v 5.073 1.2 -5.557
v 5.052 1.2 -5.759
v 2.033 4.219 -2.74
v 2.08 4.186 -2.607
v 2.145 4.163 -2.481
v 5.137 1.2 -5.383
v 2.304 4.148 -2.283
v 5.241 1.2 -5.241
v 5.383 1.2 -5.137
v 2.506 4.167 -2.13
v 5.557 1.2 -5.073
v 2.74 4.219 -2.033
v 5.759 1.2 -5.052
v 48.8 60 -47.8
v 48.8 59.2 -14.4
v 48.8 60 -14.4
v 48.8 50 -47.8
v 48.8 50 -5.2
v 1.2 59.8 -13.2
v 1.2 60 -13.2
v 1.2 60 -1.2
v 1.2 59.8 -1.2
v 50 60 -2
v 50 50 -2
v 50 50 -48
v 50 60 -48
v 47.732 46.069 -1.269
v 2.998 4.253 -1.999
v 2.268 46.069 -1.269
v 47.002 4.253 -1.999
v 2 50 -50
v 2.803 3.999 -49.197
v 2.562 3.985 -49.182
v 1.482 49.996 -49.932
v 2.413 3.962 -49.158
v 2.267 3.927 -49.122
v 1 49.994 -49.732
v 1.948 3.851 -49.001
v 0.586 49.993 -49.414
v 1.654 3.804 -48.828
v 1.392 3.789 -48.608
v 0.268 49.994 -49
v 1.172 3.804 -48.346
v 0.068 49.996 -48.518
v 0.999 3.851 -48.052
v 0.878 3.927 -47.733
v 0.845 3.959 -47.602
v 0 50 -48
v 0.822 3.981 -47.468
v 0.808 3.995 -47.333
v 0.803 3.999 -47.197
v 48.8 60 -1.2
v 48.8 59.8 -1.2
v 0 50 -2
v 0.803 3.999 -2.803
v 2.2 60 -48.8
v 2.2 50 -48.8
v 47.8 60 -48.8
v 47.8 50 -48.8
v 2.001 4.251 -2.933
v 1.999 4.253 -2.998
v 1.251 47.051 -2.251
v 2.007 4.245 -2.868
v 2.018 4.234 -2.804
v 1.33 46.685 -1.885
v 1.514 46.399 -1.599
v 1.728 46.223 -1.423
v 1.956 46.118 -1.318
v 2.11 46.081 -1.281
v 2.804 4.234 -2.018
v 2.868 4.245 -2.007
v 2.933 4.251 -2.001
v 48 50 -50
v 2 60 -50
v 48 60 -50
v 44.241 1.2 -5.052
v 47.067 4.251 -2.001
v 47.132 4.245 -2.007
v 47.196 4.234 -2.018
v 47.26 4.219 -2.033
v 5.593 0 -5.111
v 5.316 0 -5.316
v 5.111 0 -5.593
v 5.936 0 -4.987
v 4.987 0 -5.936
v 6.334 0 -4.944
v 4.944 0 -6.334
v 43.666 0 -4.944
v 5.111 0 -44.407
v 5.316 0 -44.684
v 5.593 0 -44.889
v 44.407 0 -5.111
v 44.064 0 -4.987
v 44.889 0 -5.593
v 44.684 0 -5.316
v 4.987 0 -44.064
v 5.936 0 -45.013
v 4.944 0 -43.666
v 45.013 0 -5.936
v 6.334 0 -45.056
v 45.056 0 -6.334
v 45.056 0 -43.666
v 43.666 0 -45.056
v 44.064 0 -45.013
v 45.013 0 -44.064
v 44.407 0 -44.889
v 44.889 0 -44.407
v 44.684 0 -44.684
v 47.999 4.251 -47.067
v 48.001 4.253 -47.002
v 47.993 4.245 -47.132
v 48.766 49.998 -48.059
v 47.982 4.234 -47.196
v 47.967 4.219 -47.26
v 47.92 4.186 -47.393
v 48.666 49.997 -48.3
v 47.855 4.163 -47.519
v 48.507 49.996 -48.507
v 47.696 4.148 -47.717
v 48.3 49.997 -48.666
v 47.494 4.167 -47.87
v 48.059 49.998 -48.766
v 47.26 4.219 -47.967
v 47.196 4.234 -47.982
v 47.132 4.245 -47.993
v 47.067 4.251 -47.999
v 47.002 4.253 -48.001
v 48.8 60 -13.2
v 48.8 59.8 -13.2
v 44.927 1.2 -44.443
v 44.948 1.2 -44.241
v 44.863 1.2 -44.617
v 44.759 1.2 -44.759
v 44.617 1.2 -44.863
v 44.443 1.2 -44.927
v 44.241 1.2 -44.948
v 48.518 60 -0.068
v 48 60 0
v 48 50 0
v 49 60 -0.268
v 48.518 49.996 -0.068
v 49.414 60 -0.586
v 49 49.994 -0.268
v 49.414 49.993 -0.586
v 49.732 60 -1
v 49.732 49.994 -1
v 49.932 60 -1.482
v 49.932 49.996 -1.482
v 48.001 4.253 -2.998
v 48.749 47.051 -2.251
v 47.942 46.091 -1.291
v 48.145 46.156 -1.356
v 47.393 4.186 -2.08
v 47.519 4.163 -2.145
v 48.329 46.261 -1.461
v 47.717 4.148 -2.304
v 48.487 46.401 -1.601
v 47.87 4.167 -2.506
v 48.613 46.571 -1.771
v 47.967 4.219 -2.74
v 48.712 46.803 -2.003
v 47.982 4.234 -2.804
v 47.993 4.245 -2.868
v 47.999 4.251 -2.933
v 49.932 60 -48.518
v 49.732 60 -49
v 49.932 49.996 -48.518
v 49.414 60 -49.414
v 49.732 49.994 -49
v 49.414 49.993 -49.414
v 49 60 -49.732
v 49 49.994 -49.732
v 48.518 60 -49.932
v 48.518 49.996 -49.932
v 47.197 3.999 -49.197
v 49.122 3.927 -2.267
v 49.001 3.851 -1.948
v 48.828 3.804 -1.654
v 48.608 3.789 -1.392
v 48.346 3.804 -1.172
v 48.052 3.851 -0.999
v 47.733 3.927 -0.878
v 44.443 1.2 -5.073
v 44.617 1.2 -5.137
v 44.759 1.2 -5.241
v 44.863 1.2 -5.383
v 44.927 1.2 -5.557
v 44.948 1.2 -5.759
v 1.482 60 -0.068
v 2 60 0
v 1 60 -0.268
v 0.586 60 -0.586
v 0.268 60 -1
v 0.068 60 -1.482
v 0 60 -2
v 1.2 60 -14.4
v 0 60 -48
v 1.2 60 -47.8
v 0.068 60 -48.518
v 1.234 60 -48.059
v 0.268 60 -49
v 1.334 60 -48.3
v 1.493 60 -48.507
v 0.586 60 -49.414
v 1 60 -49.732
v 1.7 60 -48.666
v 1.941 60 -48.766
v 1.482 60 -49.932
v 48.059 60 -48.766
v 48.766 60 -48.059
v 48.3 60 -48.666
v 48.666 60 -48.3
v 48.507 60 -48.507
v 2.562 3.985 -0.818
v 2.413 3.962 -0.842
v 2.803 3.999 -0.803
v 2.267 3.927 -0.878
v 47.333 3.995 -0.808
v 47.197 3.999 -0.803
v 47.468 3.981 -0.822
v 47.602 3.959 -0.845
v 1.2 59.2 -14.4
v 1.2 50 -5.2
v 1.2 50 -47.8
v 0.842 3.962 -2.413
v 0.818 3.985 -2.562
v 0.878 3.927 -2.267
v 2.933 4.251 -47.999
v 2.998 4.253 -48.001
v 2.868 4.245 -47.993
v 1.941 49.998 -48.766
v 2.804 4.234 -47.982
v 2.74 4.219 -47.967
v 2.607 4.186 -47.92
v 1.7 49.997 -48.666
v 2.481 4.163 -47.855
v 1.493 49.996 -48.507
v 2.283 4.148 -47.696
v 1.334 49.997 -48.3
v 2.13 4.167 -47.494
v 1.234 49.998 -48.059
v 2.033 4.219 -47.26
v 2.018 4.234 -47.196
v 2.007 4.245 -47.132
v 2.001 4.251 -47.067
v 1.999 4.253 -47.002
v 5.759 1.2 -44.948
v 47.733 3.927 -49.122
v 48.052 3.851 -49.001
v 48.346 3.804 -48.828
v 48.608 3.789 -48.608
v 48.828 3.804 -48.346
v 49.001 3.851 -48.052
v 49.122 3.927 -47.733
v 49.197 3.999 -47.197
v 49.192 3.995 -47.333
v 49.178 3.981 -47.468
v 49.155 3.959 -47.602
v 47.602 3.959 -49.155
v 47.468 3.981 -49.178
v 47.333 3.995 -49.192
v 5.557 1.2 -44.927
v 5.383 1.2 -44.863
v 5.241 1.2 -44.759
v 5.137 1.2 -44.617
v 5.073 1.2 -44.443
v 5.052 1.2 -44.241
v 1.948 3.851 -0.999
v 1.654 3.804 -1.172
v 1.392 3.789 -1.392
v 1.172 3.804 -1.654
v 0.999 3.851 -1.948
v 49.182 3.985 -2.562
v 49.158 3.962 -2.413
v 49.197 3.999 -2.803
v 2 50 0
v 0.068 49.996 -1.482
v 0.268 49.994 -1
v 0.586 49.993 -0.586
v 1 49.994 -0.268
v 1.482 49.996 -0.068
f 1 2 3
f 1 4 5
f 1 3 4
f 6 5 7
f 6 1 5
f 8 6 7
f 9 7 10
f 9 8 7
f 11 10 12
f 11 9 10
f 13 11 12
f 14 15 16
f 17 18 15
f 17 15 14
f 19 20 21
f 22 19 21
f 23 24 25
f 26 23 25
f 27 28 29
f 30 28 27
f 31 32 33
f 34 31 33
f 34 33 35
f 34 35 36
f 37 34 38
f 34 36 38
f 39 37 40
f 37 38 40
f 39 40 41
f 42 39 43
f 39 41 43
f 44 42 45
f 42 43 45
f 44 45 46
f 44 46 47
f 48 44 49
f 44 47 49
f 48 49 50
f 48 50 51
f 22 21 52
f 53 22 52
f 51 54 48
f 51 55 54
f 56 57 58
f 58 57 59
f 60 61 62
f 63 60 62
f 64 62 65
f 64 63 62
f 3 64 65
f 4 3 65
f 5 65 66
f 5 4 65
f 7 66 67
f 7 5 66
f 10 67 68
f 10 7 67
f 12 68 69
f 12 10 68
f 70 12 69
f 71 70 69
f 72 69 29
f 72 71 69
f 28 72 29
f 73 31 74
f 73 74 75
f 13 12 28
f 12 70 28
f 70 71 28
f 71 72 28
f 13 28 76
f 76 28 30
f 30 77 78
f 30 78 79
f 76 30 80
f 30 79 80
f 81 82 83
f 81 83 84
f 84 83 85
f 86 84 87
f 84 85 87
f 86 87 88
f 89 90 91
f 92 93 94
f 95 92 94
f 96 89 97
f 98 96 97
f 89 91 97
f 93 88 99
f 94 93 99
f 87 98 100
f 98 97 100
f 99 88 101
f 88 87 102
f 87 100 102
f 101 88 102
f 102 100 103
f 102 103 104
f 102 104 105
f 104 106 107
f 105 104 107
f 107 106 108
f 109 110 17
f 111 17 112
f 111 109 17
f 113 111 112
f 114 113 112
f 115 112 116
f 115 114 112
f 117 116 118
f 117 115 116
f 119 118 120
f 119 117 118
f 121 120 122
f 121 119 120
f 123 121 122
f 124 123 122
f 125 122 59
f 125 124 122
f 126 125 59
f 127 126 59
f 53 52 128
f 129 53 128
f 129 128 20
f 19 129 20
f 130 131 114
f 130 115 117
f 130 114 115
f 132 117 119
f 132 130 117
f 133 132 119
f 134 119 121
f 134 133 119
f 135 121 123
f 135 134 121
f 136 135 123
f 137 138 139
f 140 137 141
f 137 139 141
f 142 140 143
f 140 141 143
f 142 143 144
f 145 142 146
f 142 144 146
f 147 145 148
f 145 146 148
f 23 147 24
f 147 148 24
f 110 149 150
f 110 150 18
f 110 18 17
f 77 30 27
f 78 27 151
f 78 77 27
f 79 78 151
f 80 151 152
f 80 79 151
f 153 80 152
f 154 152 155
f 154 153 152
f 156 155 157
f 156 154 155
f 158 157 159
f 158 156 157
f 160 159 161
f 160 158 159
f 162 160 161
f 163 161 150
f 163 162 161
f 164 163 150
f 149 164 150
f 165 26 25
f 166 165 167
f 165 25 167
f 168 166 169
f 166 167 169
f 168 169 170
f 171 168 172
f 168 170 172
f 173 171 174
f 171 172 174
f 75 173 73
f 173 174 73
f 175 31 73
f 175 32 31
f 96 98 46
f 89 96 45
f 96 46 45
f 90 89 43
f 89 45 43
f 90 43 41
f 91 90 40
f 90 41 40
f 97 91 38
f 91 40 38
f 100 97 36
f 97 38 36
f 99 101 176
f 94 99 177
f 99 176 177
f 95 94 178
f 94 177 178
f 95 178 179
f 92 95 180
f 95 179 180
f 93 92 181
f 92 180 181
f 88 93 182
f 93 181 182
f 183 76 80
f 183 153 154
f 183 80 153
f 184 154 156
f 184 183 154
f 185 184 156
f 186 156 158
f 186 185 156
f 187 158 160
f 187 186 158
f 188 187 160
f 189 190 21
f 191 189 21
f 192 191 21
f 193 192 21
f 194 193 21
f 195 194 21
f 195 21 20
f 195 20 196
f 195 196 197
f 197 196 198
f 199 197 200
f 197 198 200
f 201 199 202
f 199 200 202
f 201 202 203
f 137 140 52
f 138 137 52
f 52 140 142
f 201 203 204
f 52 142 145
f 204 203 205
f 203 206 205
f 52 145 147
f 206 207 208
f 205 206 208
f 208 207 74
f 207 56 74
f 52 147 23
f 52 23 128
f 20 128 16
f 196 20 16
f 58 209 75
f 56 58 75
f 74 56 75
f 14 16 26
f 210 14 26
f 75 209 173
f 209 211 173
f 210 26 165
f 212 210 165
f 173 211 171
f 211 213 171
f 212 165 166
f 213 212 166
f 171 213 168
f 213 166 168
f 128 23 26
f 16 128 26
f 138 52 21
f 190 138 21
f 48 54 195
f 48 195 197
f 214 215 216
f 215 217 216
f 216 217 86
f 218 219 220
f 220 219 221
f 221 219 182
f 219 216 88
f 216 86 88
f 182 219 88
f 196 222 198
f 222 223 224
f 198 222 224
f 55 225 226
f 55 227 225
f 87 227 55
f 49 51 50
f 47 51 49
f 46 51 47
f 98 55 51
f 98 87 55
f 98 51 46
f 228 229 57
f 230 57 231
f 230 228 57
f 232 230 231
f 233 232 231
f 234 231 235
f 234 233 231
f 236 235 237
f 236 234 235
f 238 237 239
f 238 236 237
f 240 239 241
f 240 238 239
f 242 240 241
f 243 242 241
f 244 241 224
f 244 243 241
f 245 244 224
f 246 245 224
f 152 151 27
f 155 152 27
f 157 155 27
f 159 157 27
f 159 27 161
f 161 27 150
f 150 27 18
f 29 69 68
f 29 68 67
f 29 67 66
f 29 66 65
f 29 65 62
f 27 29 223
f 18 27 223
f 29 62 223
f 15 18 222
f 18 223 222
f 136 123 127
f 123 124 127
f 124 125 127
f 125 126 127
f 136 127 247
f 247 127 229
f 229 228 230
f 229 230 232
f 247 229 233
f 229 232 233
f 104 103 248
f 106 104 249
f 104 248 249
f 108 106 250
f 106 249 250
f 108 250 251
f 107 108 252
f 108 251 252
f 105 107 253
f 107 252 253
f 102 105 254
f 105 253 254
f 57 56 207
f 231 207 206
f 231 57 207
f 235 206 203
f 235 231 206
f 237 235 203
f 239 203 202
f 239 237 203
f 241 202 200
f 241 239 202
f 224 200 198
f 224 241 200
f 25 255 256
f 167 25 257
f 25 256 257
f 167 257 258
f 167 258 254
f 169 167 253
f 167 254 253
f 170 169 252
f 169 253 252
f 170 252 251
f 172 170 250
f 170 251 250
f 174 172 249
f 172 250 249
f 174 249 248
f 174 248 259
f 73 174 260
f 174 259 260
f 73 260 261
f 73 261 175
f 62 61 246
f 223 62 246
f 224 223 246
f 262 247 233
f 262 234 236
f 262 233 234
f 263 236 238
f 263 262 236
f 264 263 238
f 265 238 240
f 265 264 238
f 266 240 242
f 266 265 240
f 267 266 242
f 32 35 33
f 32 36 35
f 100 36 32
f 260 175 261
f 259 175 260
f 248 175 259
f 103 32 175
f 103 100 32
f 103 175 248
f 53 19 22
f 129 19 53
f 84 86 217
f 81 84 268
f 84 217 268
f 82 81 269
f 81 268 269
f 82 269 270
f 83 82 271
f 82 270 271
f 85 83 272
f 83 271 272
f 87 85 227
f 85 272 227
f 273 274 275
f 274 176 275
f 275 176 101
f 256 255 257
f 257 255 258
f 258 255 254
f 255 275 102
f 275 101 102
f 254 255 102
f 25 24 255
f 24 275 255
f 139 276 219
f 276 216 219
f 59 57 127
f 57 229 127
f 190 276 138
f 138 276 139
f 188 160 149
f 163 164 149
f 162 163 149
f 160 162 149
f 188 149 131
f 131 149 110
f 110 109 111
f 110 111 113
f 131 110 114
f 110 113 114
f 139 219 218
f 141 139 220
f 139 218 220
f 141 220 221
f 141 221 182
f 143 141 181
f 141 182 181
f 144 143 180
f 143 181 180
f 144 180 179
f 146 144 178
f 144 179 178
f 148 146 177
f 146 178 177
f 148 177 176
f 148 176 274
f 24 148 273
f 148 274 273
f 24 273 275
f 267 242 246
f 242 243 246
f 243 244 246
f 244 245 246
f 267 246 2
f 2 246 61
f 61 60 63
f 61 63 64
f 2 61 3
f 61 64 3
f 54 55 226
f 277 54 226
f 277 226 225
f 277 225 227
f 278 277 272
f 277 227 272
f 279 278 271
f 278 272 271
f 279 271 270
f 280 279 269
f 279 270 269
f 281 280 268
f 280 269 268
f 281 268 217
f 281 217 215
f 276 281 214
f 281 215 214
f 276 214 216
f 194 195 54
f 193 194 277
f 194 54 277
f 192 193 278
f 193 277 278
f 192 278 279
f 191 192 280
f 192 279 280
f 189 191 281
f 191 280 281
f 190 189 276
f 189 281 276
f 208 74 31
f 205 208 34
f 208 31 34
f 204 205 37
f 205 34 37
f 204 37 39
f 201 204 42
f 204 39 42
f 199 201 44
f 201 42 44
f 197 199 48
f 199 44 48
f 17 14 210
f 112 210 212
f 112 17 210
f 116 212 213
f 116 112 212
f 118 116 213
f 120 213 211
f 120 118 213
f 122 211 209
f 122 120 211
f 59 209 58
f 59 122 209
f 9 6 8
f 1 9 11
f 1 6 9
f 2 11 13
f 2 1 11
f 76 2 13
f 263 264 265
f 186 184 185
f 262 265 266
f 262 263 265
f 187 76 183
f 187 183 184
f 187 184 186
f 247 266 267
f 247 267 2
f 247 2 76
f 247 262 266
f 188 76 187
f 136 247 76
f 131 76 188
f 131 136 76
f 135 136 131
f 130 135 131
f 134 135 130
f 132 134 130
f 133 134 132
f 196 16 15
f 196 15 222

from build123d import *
from OCP.BRepFilletAPI import BRepFilletAPI_MakeChamfer

# Parameters (mm, degrees)
SKETCH1_W             = 50
SKETCH1_H             = 50
SKETCH1_W_2           = 47.6
SKETCH1_H_2           = 47.6
BOSS_EXTRUDE1_DEPTH   = 50
SKETCH1_3_W           = 42
SKETCH1_3_H           = 9.2
SKETCH1_3_H_2         = 1.2
SKETCH1_3_H_3         = 31.6
SKETCH1_3_W_2         = 2.8
BOSS_EXTRUDE2_DEPTH   = 1.2
DRAFT1_ANGLE          = -1
DRAFT2_ANGLE          = 1
BOSS_EXTRUDE3_START   = 50
SKETCH1_4_W           = 50
SKETCH1_4_H           = 50
SKETCH1_4_W_2         = 47.6
SKETCH1_4_H_2         = 47.6
BOSS_EXTRUDE3_DEPTH   = 10
BOSS_EXTRUDE4_START   = 60
SKETCH1_5_W           = 42
SKETCH1_5_H           = 9.2
SKETCH1_5_H_2         = 1.2
SKETCH1_5_W_2         = 2.8
BOSS_EXTRUDE4_DEPTH   = 0.8
DRAFT3_START          = 1.2
DRAFT3_DEPTH          = 47.6
CHAMFER2_SIZE         = 3
CHAMFER2_SIZE2        = 3.053760573
CHAMFER2_EDGE_2_SIZE  = 3
CHAMFER2_EDGE_2_SIZE2 = 3.053760573
CHAMFER2_EDGE_3_SIZE  = 3
CHAMFER2_EDGE_3_SIZE2 = 3.053760573
CHAMFER2_EDGE_4_SIZE  = 3
CHAMFER2_EDGE_4_SIZE2 = 3.053760573
CHAMFER4_SIZE         = 4
CHAMFER4_SIZE2        = 4.071680764
FILLET1_R             = 2
FILLET2_R             = 1
CUT_EXTRUDE3_START    = 60
SKETCH1_10_W          = 42
SKETCH1_10_H          = 9.2
CUT_EXTRUDE3_DEPTH    = 0.2


with BuildPart() as part:
    # Sketch1 → Boss-Extrude1 (new body)
    with BuildSketch(Plane(origin=(0, 0, 0), x_dir=(1, 0, 0), z_dir=(0, 1, 0))):
        with Locations((25, 25)):
            Rectangle(SKETCH1_W, SKETCH1_H)
        with Locations((25, 25)):
            Rectangle(SKETCH1_W_2, SKETCH1_H_2, mode=Mode.SUBTRACT)
    extrude(amount=BOSS_EXTRUDE1_DEPTH)

    # Sketch1<3> → Boss-Extrude2 (add)
    with BuildSketch(Plane(origin=(0, 0, 0), x_dir=(1, 0, 0), z_dir=(0, 1, 0))):
        with Locations((25, 8.6)):
            Rectangle(SKETCH1_3_W, SKETCH1_3_H)
        with Locations((25, 13.8)):
            Rectangle(SKETCH1_3_W, SKETCH1_3_H_2)
        with Locations((25, 30.2)):
            Rectangle(SKETCH1_3_W, SKETCH1_3_H_3)
        Polygon((4, 14.4), (4, 46), (46, 46), (46, 14.4), (48.8, 14.4), (48.8, 48.8), (1.2, 48.8), (1.2, 14.4), align=None)
        Polygon((4, 4), (4, 13.2), (1.2, 13.2), (1.2, 1.2), (48.8, 1.2), (48.8, 13.2), (46, 13.2), (46, 4), align=None)
        with Locations((2.6, 13.8)):
            Rectangle(SKETCH1_3_W_2, SKETCH1_3_H_2)
        with Locations((47.4, 13.8)):
            Rectangle(SKETCH1_3_W_2, SKETCH1_3_H_2)
    extrude(amount=BOSS_EXTRUDE2_DEPTH)

    # Draft1
    draft1_faces = [part.faces().sort_by_distance(p)[0] for p in [
        (0, 25, -25),
        (25, 25, -50),
        (50, 25, -25),
        (25, 25, 0),
    ]]
    draft(draft1_faces, Plane.ZX.offset(50), DRAFT1_ANGLE)

    # Draft2
    draft2_faces = [part.faces().sort_by_distance(p)[0] for p in [
        (25, 25.6, -48.8),
        (1.2, 25.6, -25),
        (48.8, 25.6, -25),
        (25, 25.6, -1.2),
    ]]
    draft(draft2_faces, Plane.ZX.offset(50), DRAFT2_ANGLE)

    # Sketch1<4> → Boss-Extrude3 (add)
    with BuildSketch(Plane(origin=(0, 0, 0), x_dir=(1, 0, 0), z_dir=(0, 1, 0)).offset(BOSS_EXTRUDE3_START)):
        with Locations((25, 25)):
            Rectangle(SKETCH1_4_W, SKETCH1_4_H)
        with Locations((25, 25)):
            Rectangle(SKETCH1_4_W_2, SKETCH1_4_H_2, mode=Mode.SUBTRACT)
    extrude(amount=BOSS_EXTRUDE3_DEPTH)

    # Sketch1<5> → Boss-Extrude4 (add)
    with BuildSketch(Plane(origin=(0, 0, 0), x_dir=(1, 0, 0), z_dir=(0, 1, 0)).offset(BOSS_EXTRUDE4_START)):
        with Locations((25, 8.6)):
            Rectangle(SKETCH1_5_W, SKETCH1_5_H)
        with Locations((25, 13.8)):
            Rectangle(SKETCH1_5_W, SKETCH1_5_H_2)
        Polygon((4, 4), (4, 13.2), (1.2, 13.2), (1.2, 1.2), (48.8, 1.2), (48.8, 13.2), (46, 13.2), (46, 4), align=None)
        with Locations((47.4, 13.8)):
            Rectangle(SKETCH1_5_W_2, SKETCH1_5_H_2)
        with Locations((2.6, 13.8)):
            Rectangle(SKETCH1_5_W_2, SKETCH1_5_H_2)
    extrude(amount=-BOSS_EXTRUDE4_DEPTH)

    # Draft3: read off the stored shape, not the designer's step
    # Draft3 outline → Draft3 (add)
    with BuildSketch(Plane.YZ.offset(DRAFT3_START)):
        Polygon((50, -1.2), (46.06862245, -1.26862245), (59.2, -14.4), (59.2, -1.2), align=None)
    extrude(amount=DRAFT3_DEPTH)

    # Chamfer2
    chamfer2_edges = [part.edges().sort_by_distance(p)[0] for p in [
        (25, 1.2, -47.948192832),
    ]]
    chamfer2_side = [part.faces().sort_by_distance(p)[0] for p in [
        (25, 1.2, -25),
    ]]
    chamfer(chamfer2_edges, length=CHAMFER2_SIZE, length2=CHAMFER2_SIZE2, reference=chamfer2_side[0])

    # Chamfer2 edge 2
    chamfer2_edge_2_edges = [part.edges().sort_by_distance(p)[0] for p in [
        (2.051807168, 1.2, -25),
    ]]
    chamfer2_edge_2_side = [part.faces().sort_by_distance(p)[0] for p in [
        (25, 1.2, -25),
    ]]
    chamfer(chamfer2_edge_2_edges, length=CHAMFER2_EDGE_2_SIZE, length2=CHAMFER2_EDGE_2_SIZE2, reference=chamfer2_edge_2_side[0])

    # Chamfer2 edge 3
    chamfer2_edge_3_edges = [part.edges().sort_by_distance(p)[0] for p in [
        (25, 1.2, -2.051807168),
    ]]
    chamfer2_edge_3_side = [part.faces().sort_by_distance(p)[0] for p in [
        (25, 1.2, -25),
    ]]
    chamfer(chamfer2_edge_3_edges, length=CHAMFER2_EDGE_3_SIZE, length2=CHAMFER2_EDGE_3_SIZE2, reference=chamfer2_edge_3_side[0])

    # Chamfer2 edge 4
    chamfer2_edge_4_edges = [part.edges().sort_by_distance(p)[0] for p in [
        (47.948192832, 1.2, -25),
    ]]
    chamfer2_edge_4_side = [part.faces().sort_by_distance(p)[0] for p in [
        (25, 1.2, -25),
    ]]
    chamfer(chamfer2_edge_4_edges, length=CHAMFER2_EDGE_4_SIZE, length2=CHAMFER2_EDGE_4_SIZE2, reference=chamfer2_edge_4_side[0])

    # Chamfer4: one chamfer whose edges measure the first distance from different faces: ONE call of the kernel's chamfer builder (chamfer() names one face for all edges)
    chamfer4_edges_1 = [part.edges().sort_by_distance(p)[0] for p in [
        (0.872753246, 0, -25),
    ]]
    chamfer4_side_1 = [part.faces().sort_by_distance(p)[0] for p in [
        (0.433792523, 25.148042974, -25),
    ]]
    chamfer4_edges_2 = [part.edges().sort_by_distance(p)[0] for p in [
        (25, 0, -49.127246754),
    ]]
    chamfer4_side_2 = [part.faces().sort_by_distance(p)[0] for p in [
        (25, 25.148042974, -49.566207477),
    ]]
    chamfer4_edges_3 = [part.edges().sort_by_distance(p)[0] for p in [
        (49.127246754, 0, -25),
    ]]
    chamfer4_side_3 = [part.faces().sort_by_distance(p)[0] for p in [
        (49.566207477, 25.148042974, -25),
    ]]
    chamfer4_edges_4 = [part.edges().sort_by_distance(p)[0] for p in [
        (25, 0, -0.872753246),
    ]]
    chamfer4_side_4 = [part.faces().sort_by_distance(p)[0] for p in [
        (25, 25.148042974, -0.433792523),
    ]]
    chamfer4 = BRepFilletAPI_MakeChamfer(part.part.solid().wrapped)
    for e in chamfer4_edges_1:
        chamfer4.Add(CHAMFER4_SIZE, CHAMFER4_SIZE2, e.wrapped, chamfer4_side_1[0].wrapped)  # the first distance lies on this face
    for e in chamfer4_edges_2:
        chamfer4.Add(CHAMFER4_SIZE, CHAMFER4_SIZE2, e.wrapped, chamfer4_side_2[0].wrapped)  # the first distance lies on this face
    for e in chamfer4_edges_3:
        chamfer4.Add(CHAMFER4_SIZE, CHAMFER4_SIZE2, e.wrapped, chamfer4_side_3[0].wrapped)  # the first distance lies on this face
    for e in chamfer4_edges_4:
        chamfer4.Add(CHAMFER4_SIZE, CHAMFER4_SIZE2, e.wrapped, chamfer4_side_4[0].wrapped)  # the first distance lies on this face
    add(Compound.cast(chamfer4.Shape()), mode=Mode.REPLACE)

    # Fillet1
    # the kernel refuses this fillet: 2 mm, written as the material it takes off along each edge
    with BuildSketch(Plane(origin=(-0.843553781, 5.589394839, 0.843553781), x_dir=(0.8117883996686079, 0.40564694005466123, 0.4200597031229852), z_dir=(0.5839517053348507, -0.5639156068713114, -0.5839517053348507)), Plane(origin=(-0.843553781, 5.589394839, -50.843553781), x_dir=(-0.4200597031229874, 0.40564694005465957, 0.8117883996686076), z_dir=(0.5839517053348504, -0.5639156068713111, 0.5839517053348512))) as fillet1_piece_1:
        with BuildLine():
            CenterArc((FILLET1_R * 0.563915606871, -FILLET1_R), FILLET1_R, 90, 58.838659397)
            Line((-FILLET1_R * 0.291797988867, -FILLET1_R * 0.482550251649), (0, 0))
            Line((0, 0), (FILLET1_R * 0.563915606871, 0))
        make_face()
    extrude(amount=12.7313357, mode=Mode.SUBTRACT)
    with BuildSketch(Plane(origin=(50.843553781, 5.589394839, 0.843553781), x_dir=(-0.8117883996686076, 0.4056469400546599, 0.420059703122987), z_dir=(-0.5839517053348513, -0.5639156068713113, -0.5839517053348505)), Plane(origin=(50.843553781, 5.589394839, -50.843553781), x_dir=(0.420059703122986, 0.4056469400546607, 0.8117883996686078), z_dir=(-0.583951705334851, -0.5639156068713108, 0.583951705334851))) as fillet1_piece_2:
        with BuildLine():
            CenterArc((FILLET1_R * 0.563915606871, FILLET1_R), FILLET1_R, 211.161340603, 58.838659397)
            Line((-FILLET1_R * 0.291797988867, FILLET1_R * 0.482550251649), (0, 0))
            Line((0, 0), (FILLET1_R * 0.563915606871, 0))
        make_face()
    extrude(amount=12.7313357, mode=Mode.SUBTRACT)
    with BuildSketch(Plane(origin=(0.890165796, -0.997564282, -0.890165796), x_dir=(0.9998477415357947, 0.017447091479365802, 0.0003045401145796421), z_dir=(-0.017449749160682707, 0.9996954598818875, 0.017449749160682707)), Plane(origin=(0.890165796, -0.997564282, -49.109834204), x_dir=(-0.0003045401145796421, 0.017447091479365802, 0.9998477415357947), z_dir=(-0.017449749160682707, 0.9996954598818875, -0.017449749160682707))) as fillet1_piece_3:
        with BuildLine():
            CenterArc((FILLET1_R * 0.999695459882, FILLET1_R), FILLET1_R, 180.017451521, 89.982548479)
            Line((-FILLET1_R * 0.000304493731645, FILLET1_R * 0.99969541351), (0, 0))
            Line((0, 0), (FILLET1_R * 0.999695459882, 0))
        make_face()
    extrude(amount=56.011577117, mode=Mode.SUBTRACT)
    with BuildSketch(Plane(origin=(49.109834204, -0.997564282, -49.109834204), x_dir=(0.0003045401145816405, 0.017447091479365767, 0.9998477415357947), z_dir=(0.017449749160682707, 0.9996954598818875, -0.017449749160682707)), Plane(origin=(49.109834204, -0.997564282, -0.890165796), x_dir=(-0.9998477415357947, 0.01744709147936578, 0.00030454011458086336), z_dir=(0.017449749160682707, 0.9996954598818875, 0.017449749160682707))) as fillet1_piece_4:
        with BuildLine():
            CenterArc((FILLET1_R * 0.999695459882, -FILLET1_R), FILLET1_R, 90, 89.982548479)
            Line((-FILLET1_R * 0.000304493731644, -FILLET1_R * 0.99969541351), (0, 0))
            Line((0, 0), (FILLET1_R * 0.999695459882, 0))
        make_face()
    extrude(amount=56.011577117, mode=Mode.SUBTRACT)
    with BuildSketch(Plane(origin=(0, 45, -50), x_dir=(0, 0, 1), z_dir=(0, 1, 0)), Plane(origin=(0, 45, 0), x_dir=(1, 0, 0), z_dir=(0, 1, 0))) as fillet1_piece_5:
        with BuildLine():
            CenterArc((FILLET1_R, FILLET1_R), FILLET1_R, 180, 90)
            Line((0, FILLET1_R), (0, 0))
            Line((0, 0), (FILLET1_R, 0))
        make_face()
    extrude(amount=20, mode=Mode.SUBTRACT)
    with BuildSketch(Plane(origin=(50, 45, 0), x_dir=(-1, 0, 0), z_dir=(0, 1, 0)), Plane(origin=(50, 45, -50), x_dir=(0, 0, 1), z_dir=(0, 1, 0))) as fillet1_piece_6:
        with BuildLine():
            CenterArc((FILLET1_R, -FILLET1_R), FILLET1_R, 90, 90)
            Line((0, -FILLET1_R), (0, 0))
            Line((0, 0), (FILLET1_R, 0))
        make_face()
    extrude(amount=20, mode=Mode.SUBTRACT)

    # Fillet2
    # the kernel refuses this fillet: 1 mm, written as the material it adds along each edge
    with BuildSketch(Plane(origin=(5.885140502, 0.366666667, -5.885140502), x_dir=(-0.40824829046386174, 0.4082482904638633, -0.8164965809277265), z_dir=(-0.5773502691896252, 0.5773502691896272, 0.5773502691896252))) as fillet2_piece_1_section:
        with BuildLine():
            CenterArc((FILLET2_R * 0.57735026919, -FILLET2_R), FILLET2_R, 90, 60)
            Line((-FILLET2_R * 0.288675134595, -FILLET2_R * 0.5), (0, 0))
            Line((0, 0), (FILLET2_R * 0.57735026919, 0))
        make_face()
    fillet2_piece_1 = extrude(amount=8.175214232, mode=Mode.PRIVATE)
    fillet2_piece_1 = split(fillet2_piece_1, bisect_by=Plane(origin=(5.885140502, 0.300029787, -2.067516207), z_dir=(0, 0.017452406437283536, -0.9998476951563913)), keep=Keep.TOP, mode=Mode.PRIVATE)
    add(fillet2_piece_1)
    with BuildSketch(Plane(origin=(5.885140502, 0.366666667, -44.114859498), x_dir=(-0.4082482904638601, 0.4082482904638647, 0.8164965809277266), z_dir=(-0.5773502691896252, 0.5773502691896274, -0.577350269189625))) as fillet2_piece_2_section:
        with BuildLine():
            CenterArc((FILLET2_R * 0.57735026919, FILLET2_R), FILLET2_R, 210, 60)
            Line((-FILLET2_R * 0.288675134595, FILLET2_R * 0.5), (0, 0))
            Line((0, 0), (FILLET2_R * 0.57735026919, 0))
        make_face()
    fillet2_piece_2 = extrude(amount=8.175214232, mode=Mode.PRIVATE)
    fillet2_piece_2 = split(fillet2_piece_2, bisect_by=Plane(origin=(5.885140502, 0.300029787, -47.932483793), z_dir=(0, 0.017452406437283536, 0.9998476951563913)), keep=Keep.TOP, mode=Mode.PRIVATE)
    add(fillet2_piece_2)
    with BuildSketch(Plane(origin=(44.114859498, 0.366666667, -5.885140502), x_dir=(0.4082482904638648, 0.40824829046386013, -0.8164965809277265), z_dir=(0.577350269189625, 0.5773502691896274, 0.5773502691896252))) as fillet2_piece_3_section:
        with BuildLine():
            CenterArc((FILLET2_R * 0.57735026919, FILLET2_R), FILLET2_R, 210, 60)
            Line((-FILLET2_R * 0.288675134595, FILLET2_R * 0.5), (0, 0))
            Line((0, 0), (FILLET2_R * 0.57735026919, 0))
        make_face()
    fillet2_piece_3 = extrude(amount=8.175214232, mode=Mode.PRIVATE)
    fillet2_piece_3 = split(fillet2_piece_3, bisect_by=Plane(origin=(44.114859498, 0.300029787, -2.067516207), z_dir=(0, 0.017452406437283536, -0.9998476951563913)), keep=Keep.TOP, mode=Mode.PRIVATE)
    add(fillet2_piece_3)
    with BuildSketch(Plane(origin=(44.114859498, 0.366666667, -44.114859498), x_dir=(-0.8164965809277265, 0.4082482904638685, -0.40824829046385624), z_dir=(0.5773502691896251, 0.5773502691896274, -0.5773502691896251))) as fillet2_piece_4_section:
        with BuildLine():
            CenterArc((FILLET2_R * 0.57735026919, FILLET2_R), FILLET2_R, 210, 60)
            Line((-FILLET2_R * 0.288675134595, FILLET2_R * 0.5), (0, 0))
            Line((0, 0), (FILLET2_R * 0.57735026919, 0))
        make_face()
    fillet2_piece_4 = extrude(amount=8.175214232, mode=Mode.PRIVATE)
    fillet2_piece_4 = split(fillet2_piece_4, bisect_by=Plane(origin=(47.932483793, 0.300029787, -44.114859498), z_dir=(-0.9998476951563913, 0.017452406437283536, 0)), keep=Keep.TOP, mode=Mode.PRIVATE)
    add(fillet2_piece_4)
    with BuildSketch(Plane(origin=(47.957877215, 1.754817939, -47.957877215), x_dir=(-0.9998477415357947, 0.017447091479365767, -0.0003045401145816405), z_dir=(0.017449749160682707, 0.9996954598818875, -0.017449749160682707))) as fillet2_piece_5_section:
        with BuildLine():
            CenterArc((FILLET2_R * 0.999695459882, FILLET2_R), FILLET2_R, 180.017451521, 89.982548479)
            Line((-FILLET2_R * 0.000304493731648, FILLET2_R * 0.99969541351), (0, 0))
            Line((0, 0), (FILLET2_R * 0.999695459882, 0))
        make_face()
    fillet2_piece_5 = extrude(amount=50.75911778, mode=Mode.PRIVATE)
    fillet2_piece_5 = split(fillet2_piece_5, bisect_by=Plane(origin=(46.730443993, 2.982251161, -47.957877215), z_dir=(-0.707106781186549, 0.7071067811865461, 0)), keep=Keep.TOP, mode=Mode.PRIVATE)
    add(fillet2_piece_5)
    with BuildSketch(Plane(origin=(2.042122785, 1.754817939, -47.957877215), x_dir=(-0.00030454011457675554, 0.01744709147936585, 0.9998477415357947), z_dir=(-0.017449749160682707, 0.9996954598818875, -0.017449749160682707))) as fillet2_piece_6_section:
        with BuildLine():
            CenterArc((FILLET2_R * 0.999695459882, FILLET2_R), FILLET2_R, 180.017451521, 89.982548479)
            Line((-FILLET2_R * 0.000304493731643, FILLET2_R * 0.99969541351), (0, 0))
            Line((0, 0), (FILLET2_R * 0.999695459882, 0))
        make_face()
    fillet2_piece_6 = extrude(amount=50.75911778, mode=Mode.PRIVATE)
    fillet2_piece_6 = split(fillet2_piece_6, bisect_by=Plane(origin=(2.042122785, 2.982251161, -46.730443993), z_dir=(0, 0.7071067811865461, 0.707106781186549)), keep=Keep.TOP, mode=Mode.PRIVATE)
    add(fillet2_piece_6)
    with BuildSketch(Plane(origin=(1.2, 47.5, -48.8), x_dir=(0, 0, 1), z_dir=(0, 1, 0)), Plane(origin=(48.8, 47.5, -48.8), x_dir=(-1, 0, 0), z_dir=(0, 1, 0))) as fillet2_piece_7:
        with BuildLine():
            CenterArc((FILLET2_R, FILLET2_R), FILLET2_R, 180, 90)
            Line((0, FILLET2_R), (0, 0))
            Line((0, 0), (FILLET2_R, 0))
        make_face()
    extrude(amount=12.5)
    with BuildSketch(Plane(origin=(2.042122785, 1.754817939, -2.042122785), x_dir=(-0.0003045401145808143, 0.017447091479365778, -0.9998477415357947), z_dir=(-0.017449749160682707, 0.9996954598818875, 0.017449749160682707))) as fillet2_piece_8_section:
        with BuildLine():
            CenterArc((FILLET2_R * 0.999695459882, -FILLET2_R), FILLET2_R, 90, 89.982548479)
            Line((-FILLET2_R * 0.000304493731648, -FILLET2_R * 0.99969541351), (0, 0))
            Line((0, 0), (FILLET2_R * 0.999695459882, 0))
        make_face()
    fillet2_piece_8 = extrude(amount=46.826542603, mode=Mode.PRIVATE)
    fillet2_piece_8 = split(fillet2_piece_8, bisect_by=Plane(origin=(2.042122785, 2.982251161, -3.269556007), z_dir=(0, 0.7071067811865462, -0.7071067811865488)), keep=Keep.TOP, mode=Mode.PRIVATE)
    add(fillet2_piece_8)
    with BuildSketch(Plane(origin=(47.957877215, 1.754817939, -2.042122785), x_dir=(0.0003045401145816405, 0.017447091479365767, -0.9998477415357947), z_dir=(0.017449749160682707, 0.9996954598818875, 0.017449749160682707))) as fillet2_piece_9_section:
        with BuildLine():
            CenterArc((FILLET2_R * 0.999695459882, FILLET2_R), FILLET2_R, 180.017451521, 89.982548479)
            Line((-FILLET2_R * 0.000304493731647, FILLET2_R * 0.99969541351), (0, 0))
            Line((0, 0), (FILLET2_R * 0.999695459882, 0))
        make_face()
    fillet2_piece_9 = extrude(amount=46.826542603, mode=Mode.PRIVATE)
    fillet2_piece_9 = split(fillet2_piece_9, bisect_by=Plane(origin=(47.957877215, 2.982251161, -3.269556007), z_dir=(0, 0.7071067811865462, -0.7071067811865488)), keep=Keep.TOP, mode=Mode.PRIVATE)
    add(fillet2_piece_9)

    # Sketch1<10> → Cut-Extrude3 (cut)
    with BuildSketch(Plane(origin=(0, 0, 0), x_dir=(1, 0, 0), z_dir=(0, 1, 0)).offset(CUT_EXTRUDE3_START)):
        with Locations((25, 8.6)):
            Rectangle(SKETCH1_10_W, SKETCH1_10_H)
        Polygon((4, 4), (4, 13.2), (1.2, 13.2), (1.2, 1.2), (48.8, 1.2), (48.8, 13.2), (46, 13.2), (46, 4), align=None)
    extrude(amount=-CUT_EXTRUDE3_DEPTH, mode=Mode.SUBTRACT)


solid = part.part
